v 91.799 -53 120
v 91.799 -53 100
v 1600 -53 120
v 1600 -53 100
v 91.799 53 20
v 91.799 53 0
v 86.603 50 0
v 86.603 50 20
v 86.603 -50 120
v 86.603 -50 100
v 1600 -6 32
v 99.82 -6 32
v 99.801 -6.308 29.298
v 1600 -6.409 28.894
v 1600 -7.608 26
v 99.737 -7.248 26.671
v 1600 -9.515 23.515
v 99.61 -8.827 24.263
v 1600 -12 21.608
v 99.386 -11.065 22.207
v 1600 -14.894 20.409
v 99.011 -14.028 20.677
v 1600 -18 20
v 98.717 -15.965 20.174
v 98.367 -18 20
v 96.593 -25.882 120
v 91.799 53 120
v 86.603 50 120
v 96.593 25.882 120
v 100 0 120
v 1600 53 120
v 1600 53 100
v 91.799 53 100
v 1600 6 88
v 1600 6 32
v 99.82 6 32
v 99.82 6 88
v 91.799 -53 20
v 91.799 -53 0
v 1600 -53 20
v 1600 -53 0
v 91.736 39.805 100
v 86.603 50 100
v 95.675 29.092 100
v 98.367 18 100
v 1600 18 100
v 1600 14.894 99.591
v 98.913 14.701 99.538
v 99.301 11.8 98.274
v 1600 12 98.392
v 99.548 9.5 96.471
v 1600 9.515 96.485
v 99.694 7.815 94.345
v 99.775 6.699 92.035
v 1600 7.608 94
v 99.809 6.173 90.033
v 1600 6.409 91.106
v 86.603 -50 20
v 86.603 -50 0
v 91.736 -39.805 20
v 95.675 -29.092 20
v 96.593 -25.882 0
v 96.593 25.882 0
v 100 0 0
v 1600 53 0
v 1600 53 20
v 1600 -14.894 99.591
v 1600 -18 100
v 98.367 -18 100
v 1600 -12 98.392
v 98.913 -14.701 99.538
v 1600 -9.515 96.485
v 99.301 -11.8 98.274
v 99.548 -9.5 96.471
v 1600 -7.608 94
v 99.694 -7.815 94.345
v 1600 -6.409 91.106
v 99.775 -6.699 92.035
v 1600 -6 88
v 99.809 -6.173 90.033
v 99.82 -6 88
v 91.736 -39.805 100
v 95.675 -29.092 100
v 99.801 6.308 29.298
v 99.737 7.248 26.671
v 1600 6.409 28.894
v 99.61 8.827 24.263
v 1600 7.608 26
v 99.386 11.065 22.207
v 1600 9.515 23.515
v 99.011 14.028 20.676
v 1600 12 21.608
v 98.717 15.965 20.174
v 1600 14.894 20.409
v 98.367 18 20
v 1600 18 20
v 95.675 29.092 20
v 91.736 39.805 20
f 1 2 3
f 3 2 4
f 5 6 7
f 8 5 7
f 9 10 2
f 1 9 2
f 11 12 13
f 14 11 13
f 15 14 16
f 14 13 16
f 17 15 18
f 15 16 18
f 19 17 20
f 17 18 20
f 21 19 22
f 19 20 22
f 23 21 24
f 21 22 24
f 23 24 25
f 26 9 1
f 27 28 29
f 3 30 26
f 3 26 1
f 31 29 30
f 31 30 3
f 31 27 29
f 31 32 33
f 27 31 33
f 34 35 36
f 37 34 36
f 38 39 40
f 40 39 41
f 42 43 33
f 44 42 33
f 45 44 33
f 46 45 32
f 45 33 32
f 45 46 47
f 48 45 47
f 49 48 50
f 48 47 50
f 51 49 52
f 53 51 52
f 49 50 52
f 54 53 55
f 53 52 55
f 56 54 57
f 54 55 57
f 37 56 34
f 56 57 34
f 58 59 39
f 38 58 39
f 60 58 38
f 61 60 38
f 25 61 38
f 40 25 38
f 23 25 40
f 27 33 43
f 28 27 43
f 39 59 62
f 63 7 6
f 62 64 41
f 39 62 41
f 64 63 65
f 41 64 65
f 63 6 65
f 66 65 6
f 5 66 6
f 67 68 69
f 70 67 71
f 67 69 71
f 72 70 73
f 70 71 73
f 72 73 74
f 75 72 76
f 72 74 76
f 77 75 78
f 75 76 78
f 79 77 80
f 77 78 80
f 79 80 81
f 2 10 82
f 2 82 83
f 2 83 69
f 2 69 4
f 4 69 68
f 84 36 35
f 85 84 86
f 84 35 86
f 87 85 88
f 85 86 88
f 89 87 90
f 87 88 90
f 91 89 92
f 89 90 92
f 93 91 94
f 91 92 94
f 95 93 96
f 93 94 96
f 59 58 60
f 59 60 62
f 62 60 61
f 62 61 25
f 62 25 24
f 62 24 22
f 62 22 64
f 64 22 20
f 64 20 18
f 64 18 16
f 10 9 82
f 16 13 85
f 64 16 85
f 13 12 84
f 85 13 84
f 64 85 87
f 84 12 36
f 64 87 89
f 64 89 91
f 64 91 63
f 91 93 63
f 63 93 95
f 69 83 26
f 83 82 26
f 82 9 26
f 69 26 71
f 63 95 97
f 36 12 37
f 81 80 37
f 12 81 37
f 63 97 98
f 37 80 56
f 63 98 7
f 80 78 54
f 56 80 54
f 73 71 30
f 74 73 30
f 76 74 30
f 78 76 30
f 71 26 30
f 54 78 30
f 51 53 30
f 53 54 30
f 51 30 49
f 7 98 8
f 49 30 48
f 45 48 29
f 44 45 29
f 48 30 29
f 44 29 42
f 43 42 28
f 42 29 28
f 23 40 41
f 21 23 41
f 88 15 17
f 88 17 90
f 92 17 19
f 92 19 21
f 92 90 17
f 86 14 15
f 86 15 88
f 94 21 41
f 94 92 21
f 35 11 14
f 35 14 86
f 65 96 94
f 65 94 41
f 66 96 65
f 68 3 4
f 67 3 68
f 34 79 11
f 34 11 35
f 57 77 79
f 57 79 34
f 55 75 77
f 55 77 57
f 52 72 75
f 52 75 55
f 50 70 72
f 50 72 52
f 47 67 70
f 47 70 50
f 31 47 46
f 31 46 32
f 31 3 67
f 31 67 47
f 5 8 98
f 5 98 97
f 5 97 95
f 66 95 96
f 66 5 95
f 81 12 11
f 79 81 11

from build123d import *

# Parameters (mm, degrees)
F1_DEPTH     = 20
F3_DEPTH     = 80
F5_DEPTH     = 20
F6_T4_DEPTH  = 1530.1801622923
F6_S5_R      = 100
F6_T6_DEPTH  = 767
F6_T10_DEPTH = 1530.1801622923
F6_S11_R     = 100
F6_T12_DEPTH = 767
F6_T16_DEPTH = 1530.1801622923
F6_S17_R     = 100
F6_T18_DEPTH = 767
F6_T22_DEPTH = 1530.1801622923
F6_S23_R     = 100
F6_T24_DEPTH = 767


# Not quite as in the source:
# - a fillet or chamfer that OpenCascade refuses, or shapes differently, is made with other operations: its cross-section is extruded or revolved along the edge and cut away or added


with BuildPart() as f1:
    # F0 (on Top) → F1 (new body)
    with BuildSketch(Plane.XY):
        with BuildLine():
            Line((1600, -53), (1600, 0))
            Line((1600, 0), (1600, 53))
            Line((1600, 53), (91.7986928012, 53))
            Line((91.7986928012, 53), (86.6025403784, 50))
            ThreePointArc((86.6025403784, 50), (100, 0), (86.6025403784, -50))
            Line((86.6025403784, -50), (91.7986928012, -53))
            Line((91.7986928012, -53), (1600, -53))
        make_face()
    extrude(amount=F1_DEPTH)

    # F2 (on face) → F3 (join)
    with BuildSketch(Plane.XY.offset(20)):
        with BuildLine():
            ThreePointArc((99.8198377077, 6), (100, 0), (99.8198377077, -6))
            Line((99.8198377077, -6), (1600, -6))
            Line((1600, -6), (1600, 6))
            Line((1600, 6), (99.8198377077, 6))
        make_face()
    extrude(amount=F3_DEPTH)

    # F4 (on face) → F5 (join)
    with BuildSketch(Plane.XY.offset(100)):
        with BuildLine():
            ThreePointArc((86.6025403784, 50), (100, 0), (86.6025403784, -50))
            Line((86.6025403784, -50), (91.7986928012, -53))
            Line((91.7986928012, -53), (1600, -53))
            Line((1600, -53), (1600, 53))
            Line((1600, 53), (91.7986928012, 53))
            Line((91.7986928012, 53), (86.6025403784, 50))
        make_face()
    extrude(amount=F5_DEPTH)

    # F6: fillet of radius 12 on 4 edges, made by hand


with BuildPart() as f6_tool2:
    # F6_s3 → F6_t4 (new body)
    with BuildSketch(Plane.YZ.offset(1600)):
        with BuildLine():
            ThreePointArc((6, 32), (9.5147186258, 23.5147186258), (18, 20))
            Line((18, 20), (6, 20))
            Line((6, 20), (6, 32))
        make_face()
    extrude(amount=-F6_T4_DEPTH)

    # F6_s5 → F6_t6 (cut, symmetric)
    with BuildSketch(Plane.XY.offset(26)):
        Circle(F6_S5_R)
    extrude(amount=F6_T6_DEPTH, both=True, mode=Mode.SUBTRACT)


with BuildPart() as f1_1:
    add(f1.part)

    # F6_t1: union F6_tool2
    add(f6_tool2.part)


with BuildPart() as f6_tool8:
    # F6_s9 → F6_t10 (new body)
    with BuildSketch(Plane.YZ.offset(69.8198377077)):
        with BuildLine():
            ThreePointArc((-6, 32), (-9.5147186258, 23.5147186258), (-18, 20))
            Line((-18, 20), (-6, 20))
            Line((-6, 20), (-6, 32))
        make_face()
    extrude(amount=F6_T10_DEPTH)

    # F6_s11 → F6_t12 (cut, symmetric)
    with BuildSketch(Plane.XY.offset(26)):
        Circle(F6_S11_R)
    extrude(amount=F6_T12_DEPTH, both=True, mode=Mode.SUBTRACT)


with BuildPart() as f1_2:
    add(f1_1.part)

    # F6_t7: union F6_tool8
    add(f6_tool8.part)


with BuildPart() as f6_tool14:
    # F6_s15 → F6_t16 (new body)
    with BuildSketch(Plane.YZ.offset(1600)):
        with BuildLine():
            ThreePointArc((18, 100), (9.5147186258, 96.4852813742), (6, 88))
            Line((6, 88), (6, 100))
            Line((6, 100), (18, 100))
        make_face()
    extrude(amount=-F6_T16_DEPTH)

    # F6_s17 → F6_t18 (cut, symmetric)
    with BuildSketch(Plane.XY.offset(94)):
        Circle(F6_S17_R)
    extrude(amount=F6_T18_DEPTH, both=True, mode=Mode.SUBTRACT)


with BuildPart() as f1_3:
    add(f1_2.part)

    # F6_t13: union F6_tool14
    add(f6_tool14.part)


with BuildPart() as f6_tool20:
    # F6_s21 → F6_t22 (new body)
    with BuildSketch(Plane.YZ.offset(69.8198377077)):
        with BuildLine():
            ThreePointArc((-18, 100), (-9.5147186258, 96.4852813742), (-6, 88))
            Line((-6, 88), (-6, 100))
            Line((-6, 100), (-18, 100))
        make_face()
    extrude(amount=F6_T22_DEPTH)

    # F6_s23 → F6_t24 (cut, symmetric)
    with BuildSketch(Plane.XY.offset(94)):
        Circle(F6_S23_R)
    extrude(amount=F6_T24_DEPTH, both=True, mode=Mode.SUBTRACT)


with BuildPart() as f1_4:
    add(f1_3.part)

    # F6_t19: union F6_tool20
    add(f6_tool20.part)


solid = f1_4.part
